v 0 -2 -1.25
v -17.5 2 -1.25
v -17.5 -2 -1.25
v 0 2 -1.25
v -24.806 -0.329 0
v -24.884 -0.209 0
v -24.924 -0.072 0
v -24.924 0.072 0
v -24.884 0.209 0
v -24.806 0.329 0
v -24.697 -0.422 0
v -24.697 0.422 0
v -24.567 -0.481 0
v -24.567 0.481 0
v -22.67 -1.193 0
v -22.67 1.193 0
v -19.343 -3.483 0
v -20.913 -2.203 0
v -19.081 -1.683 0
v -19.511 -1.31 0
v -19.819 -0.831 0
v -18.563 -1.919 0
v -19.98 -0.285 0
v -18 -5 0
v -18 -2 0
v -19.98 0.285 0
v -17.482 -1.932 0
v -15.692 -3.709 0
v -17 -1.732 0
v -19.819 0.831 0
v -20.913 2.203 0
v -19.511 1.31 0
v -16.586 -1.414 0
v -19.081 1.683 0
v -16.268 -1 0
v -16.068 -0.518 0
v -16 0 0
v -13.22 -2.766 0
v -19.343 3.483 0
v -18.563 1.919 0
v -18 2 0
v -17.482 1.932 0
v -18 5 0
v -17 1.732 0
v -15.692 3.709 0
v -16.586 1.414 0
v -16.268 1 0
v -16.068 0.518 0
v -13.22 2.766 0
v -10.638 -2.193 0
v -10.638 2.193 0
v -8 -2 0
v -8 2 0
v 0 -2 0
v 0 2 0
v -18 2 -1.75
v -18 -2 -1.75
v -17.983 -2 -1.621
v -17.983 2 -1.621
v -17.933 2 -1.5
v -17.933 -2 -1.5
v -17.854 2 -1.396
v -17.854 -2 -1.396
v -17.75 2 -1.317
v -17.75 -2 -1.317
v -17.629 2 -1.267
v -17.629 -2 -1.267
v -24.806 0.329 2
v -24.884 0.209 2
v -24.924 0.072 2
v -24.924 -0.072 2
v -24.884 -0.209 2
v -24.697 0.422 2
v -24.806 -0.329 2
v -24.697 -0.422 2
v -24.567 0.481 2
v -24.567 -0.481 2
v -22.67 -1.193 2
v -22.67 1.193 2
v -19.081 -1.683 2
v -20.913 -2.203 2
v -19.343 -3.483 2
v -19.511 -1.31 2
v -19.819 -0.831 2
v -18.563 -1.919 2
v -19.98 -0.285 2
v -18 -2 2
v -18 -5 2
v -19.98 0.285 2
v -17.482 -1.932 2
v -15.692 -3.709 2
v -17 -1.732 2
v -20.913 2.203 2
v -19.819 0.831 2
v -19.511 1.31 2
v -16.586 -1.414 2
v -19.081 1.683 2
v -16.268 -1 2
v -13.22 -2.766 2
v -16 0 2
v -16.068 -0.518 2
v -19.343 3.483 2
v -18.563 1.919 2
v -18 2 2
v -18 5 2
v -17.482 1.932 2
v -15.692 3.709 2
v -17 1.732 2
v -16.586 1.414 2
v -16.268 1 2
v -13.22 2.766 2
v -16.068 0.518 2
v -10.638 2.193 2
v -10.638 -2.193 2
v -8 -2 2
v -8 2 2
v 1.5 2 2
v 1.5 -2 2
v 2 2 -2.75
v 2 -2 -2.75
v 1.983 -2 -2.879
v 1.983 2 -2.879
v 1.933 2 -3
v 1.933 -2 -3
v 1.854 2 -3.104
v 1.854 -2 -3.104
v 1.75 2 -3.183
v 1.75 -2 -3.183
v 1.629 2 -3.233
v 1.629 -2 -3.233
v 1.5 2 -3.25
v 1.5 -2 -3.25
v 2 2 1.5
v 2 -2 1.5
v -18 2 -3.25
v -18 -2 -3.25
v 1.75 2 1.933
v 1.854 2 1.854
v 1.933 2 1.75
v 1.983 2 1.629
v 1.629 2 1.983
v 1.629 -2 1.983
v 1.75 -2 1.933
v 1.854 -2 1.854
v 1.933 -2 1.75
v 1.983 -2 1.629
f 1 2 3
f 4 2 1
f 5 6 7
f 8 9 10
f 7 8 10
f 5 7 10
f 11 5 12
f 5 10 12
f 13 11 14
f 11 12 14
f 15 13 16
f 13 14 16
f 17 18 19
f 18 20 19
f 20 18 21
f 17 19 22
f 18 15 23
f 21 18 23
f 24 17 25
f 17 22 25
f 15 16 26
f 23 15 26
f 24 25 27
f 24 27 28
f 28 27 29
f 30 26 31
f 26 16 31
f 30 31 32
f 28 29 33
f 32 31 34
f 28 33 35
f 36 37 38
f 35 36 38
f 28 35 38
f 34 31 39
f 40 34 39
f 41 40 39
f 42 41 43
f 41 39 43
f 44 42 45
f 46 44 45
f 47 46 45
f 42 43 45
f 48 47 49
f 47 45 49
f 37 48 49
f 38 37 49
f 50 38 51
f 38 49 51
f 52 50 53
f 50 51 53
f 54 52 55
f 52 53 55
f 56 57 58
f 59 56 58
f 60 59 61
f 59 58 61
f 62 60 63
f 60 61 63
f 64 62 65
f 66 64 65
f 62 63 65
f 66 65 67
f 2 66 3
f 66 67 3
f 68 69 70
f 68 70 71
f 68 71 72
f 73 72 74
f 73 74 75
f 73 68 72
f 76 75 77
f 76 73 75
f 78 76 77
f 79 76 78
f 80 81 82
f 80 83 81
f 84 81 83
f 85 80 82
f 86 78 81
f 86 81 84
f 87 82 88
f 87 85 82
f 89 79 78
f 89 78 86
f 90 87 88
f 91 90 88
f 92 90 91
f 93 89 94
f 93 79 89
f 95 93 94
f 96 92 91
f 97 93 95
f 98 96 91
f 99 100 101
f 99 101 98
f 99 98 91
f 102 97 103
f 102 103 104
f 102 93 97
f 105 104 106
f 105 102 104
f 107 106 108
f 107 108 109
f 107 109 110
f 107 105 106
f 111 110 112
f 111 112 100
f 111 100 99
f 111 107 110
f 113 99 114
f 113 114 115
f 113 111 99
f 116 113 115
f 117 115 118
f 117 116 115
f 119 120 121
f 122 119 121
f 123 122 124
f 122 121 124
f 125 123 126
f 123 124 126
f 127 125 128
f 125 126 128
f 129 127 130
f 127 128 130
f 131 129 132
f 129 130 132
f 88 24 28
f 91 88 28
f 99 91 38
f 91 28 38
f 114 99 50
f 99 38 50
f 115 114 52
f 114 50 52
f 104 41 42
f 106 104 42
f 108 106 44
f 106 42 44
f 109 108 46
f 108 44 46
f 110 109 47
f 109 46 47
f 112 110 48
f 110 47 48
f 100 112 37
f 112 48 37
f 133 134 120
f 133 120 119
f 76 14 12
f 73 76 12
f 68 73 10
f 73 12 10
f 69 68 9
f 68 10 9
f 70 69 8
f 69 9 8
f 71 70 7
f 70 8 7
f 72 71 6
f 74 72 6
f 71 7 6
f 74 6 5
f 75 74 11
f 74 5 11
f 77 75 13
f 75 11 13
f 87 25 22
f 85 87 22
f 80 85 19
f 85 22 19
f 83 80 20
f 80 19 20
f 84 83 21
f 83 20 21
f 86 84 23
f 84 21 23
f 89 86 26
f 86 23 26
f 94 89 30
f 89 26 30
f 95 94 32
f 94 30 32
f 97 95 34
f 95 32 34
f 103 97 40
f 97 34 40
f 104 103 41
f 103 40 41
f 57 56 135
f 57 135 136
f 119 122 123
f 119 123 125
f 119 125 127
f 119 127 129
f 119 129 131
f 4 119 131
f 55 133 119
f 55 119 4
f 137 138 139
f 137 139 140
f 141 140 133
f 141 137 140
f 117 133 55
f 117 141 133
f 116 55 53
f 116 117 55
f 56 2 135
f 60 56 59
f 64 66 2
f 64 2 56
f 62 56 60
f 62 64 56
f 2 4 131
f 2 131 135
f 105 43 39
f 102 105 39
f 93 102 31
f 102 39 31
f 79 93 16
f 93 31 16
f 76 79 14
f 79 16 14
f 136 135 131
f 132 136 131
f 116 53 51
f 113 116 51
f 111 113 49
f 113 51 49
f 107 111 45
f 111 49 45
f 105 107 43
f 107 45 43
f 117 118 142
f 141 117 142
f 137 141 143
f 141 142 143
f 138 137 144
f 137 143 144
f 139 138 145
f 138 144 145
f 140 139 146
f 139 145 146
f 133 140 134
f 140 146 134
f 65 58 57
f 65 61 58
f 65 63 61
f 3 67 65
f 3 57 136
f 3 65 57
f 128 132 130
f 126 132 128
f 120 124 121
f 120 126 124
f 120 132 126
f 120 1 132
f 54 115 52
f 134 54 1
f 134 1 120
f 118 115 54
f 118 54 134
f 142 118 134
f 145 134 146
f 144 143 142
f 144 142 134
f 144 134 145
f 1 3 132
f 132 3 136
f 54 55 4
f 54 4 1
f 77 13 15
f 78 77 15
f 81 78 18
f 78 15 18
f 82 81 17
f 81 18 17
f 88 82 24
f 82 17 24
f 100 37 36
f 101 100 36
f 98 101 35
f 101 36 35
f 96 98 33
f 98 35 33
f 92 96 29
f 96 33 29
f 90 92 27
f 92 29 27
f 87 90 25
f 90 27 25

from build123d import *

# Parameters (mm, degrees)
F4_DEPTH = 2
F5_DEPTH = 1.25
F6_START = -1.25
F6_DEPTH = 2
F8_DEPTH = 4


# Not quite as in the source:
# - a feature names something its author has since deleted; it is built from what else it names


with BuildPart() as f4:
    # F3 (on Top) → F4 (new body)
    with BuildSketch(Plane.XY):
        with BuildLine():
            Line((0, -2), (0, 0))
            Line((0, 0), (0, 2))
            Line((0, 2), (-8, 2))
            Line((-8, 2), (-18, 2))
            ThreePointArc((-18, 2), (-16.5857864376, 1.4142135624), (-16, 0))
            ThreePointArc((-16, 0), (-16.5857864376, -1.4142135624), (-18, -2))
            Line((-18, -2), (-8, -2))
            Line((-8, -2), (0, -2))
        make_face()
        Polygon((0, 2), (0, 0), (0, -2), (2, -2), (2, 2), align=None)
        with BuildLine():
            Line((-18, 2), (-8, 2))
            ThreePointArc((-8, 2), (-13.2201532545, 2.7661558185), (-18, 5))
            ThreePointArc((-18, 5), (-20.9134084444, 2.2029023447), (-24.5666209478, 0.4807692308))
            ThreePointArc((-24.5666209478, 0.4807692308), (-24.9292857857, 0), (-24.5666209478, -0.4807692308))
            ThreePointArc((-24.5666209478, -0.4807692308), (-20.9134084444, -2.2029023447), (-18, -5))
            ThreePointArc((-18, -5), (-13.2201532545, -2.7661558185), (-8, -2))
            Line((-8, -2), (-18, -2))
            ThreePointArc((-18, -2), (-20, 0), (-18, 2))
        make_face()
    extrude(amount=F4_DEPTH)

    # F3 (on Top) → F5 (join)
    with BuildSketch(Plane.XY):
        Polygon((0, 2), (0, 0), (0, -2), (2, -2), (2, 2), align=None)
    extrude(amount=-F5_DEPTH)

    # F3 (on Top) → F6 (join)
    with BuildSketch(Plane.XY.offset(F6_START)):
        with BuildLine():
            Line((0, -2), (0, 0))
            Line((0, 0), (0, 2))
            Line((0, 2), (-8, 2))
            Line((-8, 2), (-18, 2))
            ThreePointArc((-18, 2), (-16.5857864376, 1.4142135624), (-16, 0))
            ThreePointArc((-16, 0), (-16.5857864376, -1.4142135624), (-18, -2))
            Line((-18, -2), (-8, -2))
            Line((-8, -2), (0, -2))
        make_face()
        Polygon((0, 2), (0, 0), (0, -2), (2, -2), (2, 2), align=None)
        with BuildLine():
            ThreePointArc((-16, 0), (-16.5857864376, 1.4142135624), (-18, 2))
            Line((-18, 2), (-18, -2))
            ThreePointArc((-18, -2), (-16.5857864376, -1.4142135624), (-16, 0))
        make_face()
    extrude(amount=-F6_DEPTH)

    # F7 (on face) → F8 (cut)
    with BuildSketch(Plane.XZ.offset(2)):
        with BuildLine():
            Line((-18, -1.25), (-18, -1.75))
            ThreePointArc((-18, -1.75), (-17.8535533906, -1.3964466094), (-17.5, -1.25))
            Line((-17.5, -1.25), (-18, -1.25))
        make_face()
        with BuildLine():
            ThreePointArc((1.5, 2), (1.8535533906, 1.8535533906), (2, 1.5))
            Line((2, 1.5), (2, 2))
            Line((2, 2), (1.5, 2))
        make_face()
        with BuildLine():
            ThreePointArc((2, -2.75), (1.8535533906, -3.1035533906), (1.5, -3.25))
            Line((1.5, -3.25), (2, -3.25))
            Line((2, -3.25), (2, -2.75))
        make_face()
    extrude(amount=-F8_DEPTH, mode=Mode.SUBTRACT)


solid = f4.part
